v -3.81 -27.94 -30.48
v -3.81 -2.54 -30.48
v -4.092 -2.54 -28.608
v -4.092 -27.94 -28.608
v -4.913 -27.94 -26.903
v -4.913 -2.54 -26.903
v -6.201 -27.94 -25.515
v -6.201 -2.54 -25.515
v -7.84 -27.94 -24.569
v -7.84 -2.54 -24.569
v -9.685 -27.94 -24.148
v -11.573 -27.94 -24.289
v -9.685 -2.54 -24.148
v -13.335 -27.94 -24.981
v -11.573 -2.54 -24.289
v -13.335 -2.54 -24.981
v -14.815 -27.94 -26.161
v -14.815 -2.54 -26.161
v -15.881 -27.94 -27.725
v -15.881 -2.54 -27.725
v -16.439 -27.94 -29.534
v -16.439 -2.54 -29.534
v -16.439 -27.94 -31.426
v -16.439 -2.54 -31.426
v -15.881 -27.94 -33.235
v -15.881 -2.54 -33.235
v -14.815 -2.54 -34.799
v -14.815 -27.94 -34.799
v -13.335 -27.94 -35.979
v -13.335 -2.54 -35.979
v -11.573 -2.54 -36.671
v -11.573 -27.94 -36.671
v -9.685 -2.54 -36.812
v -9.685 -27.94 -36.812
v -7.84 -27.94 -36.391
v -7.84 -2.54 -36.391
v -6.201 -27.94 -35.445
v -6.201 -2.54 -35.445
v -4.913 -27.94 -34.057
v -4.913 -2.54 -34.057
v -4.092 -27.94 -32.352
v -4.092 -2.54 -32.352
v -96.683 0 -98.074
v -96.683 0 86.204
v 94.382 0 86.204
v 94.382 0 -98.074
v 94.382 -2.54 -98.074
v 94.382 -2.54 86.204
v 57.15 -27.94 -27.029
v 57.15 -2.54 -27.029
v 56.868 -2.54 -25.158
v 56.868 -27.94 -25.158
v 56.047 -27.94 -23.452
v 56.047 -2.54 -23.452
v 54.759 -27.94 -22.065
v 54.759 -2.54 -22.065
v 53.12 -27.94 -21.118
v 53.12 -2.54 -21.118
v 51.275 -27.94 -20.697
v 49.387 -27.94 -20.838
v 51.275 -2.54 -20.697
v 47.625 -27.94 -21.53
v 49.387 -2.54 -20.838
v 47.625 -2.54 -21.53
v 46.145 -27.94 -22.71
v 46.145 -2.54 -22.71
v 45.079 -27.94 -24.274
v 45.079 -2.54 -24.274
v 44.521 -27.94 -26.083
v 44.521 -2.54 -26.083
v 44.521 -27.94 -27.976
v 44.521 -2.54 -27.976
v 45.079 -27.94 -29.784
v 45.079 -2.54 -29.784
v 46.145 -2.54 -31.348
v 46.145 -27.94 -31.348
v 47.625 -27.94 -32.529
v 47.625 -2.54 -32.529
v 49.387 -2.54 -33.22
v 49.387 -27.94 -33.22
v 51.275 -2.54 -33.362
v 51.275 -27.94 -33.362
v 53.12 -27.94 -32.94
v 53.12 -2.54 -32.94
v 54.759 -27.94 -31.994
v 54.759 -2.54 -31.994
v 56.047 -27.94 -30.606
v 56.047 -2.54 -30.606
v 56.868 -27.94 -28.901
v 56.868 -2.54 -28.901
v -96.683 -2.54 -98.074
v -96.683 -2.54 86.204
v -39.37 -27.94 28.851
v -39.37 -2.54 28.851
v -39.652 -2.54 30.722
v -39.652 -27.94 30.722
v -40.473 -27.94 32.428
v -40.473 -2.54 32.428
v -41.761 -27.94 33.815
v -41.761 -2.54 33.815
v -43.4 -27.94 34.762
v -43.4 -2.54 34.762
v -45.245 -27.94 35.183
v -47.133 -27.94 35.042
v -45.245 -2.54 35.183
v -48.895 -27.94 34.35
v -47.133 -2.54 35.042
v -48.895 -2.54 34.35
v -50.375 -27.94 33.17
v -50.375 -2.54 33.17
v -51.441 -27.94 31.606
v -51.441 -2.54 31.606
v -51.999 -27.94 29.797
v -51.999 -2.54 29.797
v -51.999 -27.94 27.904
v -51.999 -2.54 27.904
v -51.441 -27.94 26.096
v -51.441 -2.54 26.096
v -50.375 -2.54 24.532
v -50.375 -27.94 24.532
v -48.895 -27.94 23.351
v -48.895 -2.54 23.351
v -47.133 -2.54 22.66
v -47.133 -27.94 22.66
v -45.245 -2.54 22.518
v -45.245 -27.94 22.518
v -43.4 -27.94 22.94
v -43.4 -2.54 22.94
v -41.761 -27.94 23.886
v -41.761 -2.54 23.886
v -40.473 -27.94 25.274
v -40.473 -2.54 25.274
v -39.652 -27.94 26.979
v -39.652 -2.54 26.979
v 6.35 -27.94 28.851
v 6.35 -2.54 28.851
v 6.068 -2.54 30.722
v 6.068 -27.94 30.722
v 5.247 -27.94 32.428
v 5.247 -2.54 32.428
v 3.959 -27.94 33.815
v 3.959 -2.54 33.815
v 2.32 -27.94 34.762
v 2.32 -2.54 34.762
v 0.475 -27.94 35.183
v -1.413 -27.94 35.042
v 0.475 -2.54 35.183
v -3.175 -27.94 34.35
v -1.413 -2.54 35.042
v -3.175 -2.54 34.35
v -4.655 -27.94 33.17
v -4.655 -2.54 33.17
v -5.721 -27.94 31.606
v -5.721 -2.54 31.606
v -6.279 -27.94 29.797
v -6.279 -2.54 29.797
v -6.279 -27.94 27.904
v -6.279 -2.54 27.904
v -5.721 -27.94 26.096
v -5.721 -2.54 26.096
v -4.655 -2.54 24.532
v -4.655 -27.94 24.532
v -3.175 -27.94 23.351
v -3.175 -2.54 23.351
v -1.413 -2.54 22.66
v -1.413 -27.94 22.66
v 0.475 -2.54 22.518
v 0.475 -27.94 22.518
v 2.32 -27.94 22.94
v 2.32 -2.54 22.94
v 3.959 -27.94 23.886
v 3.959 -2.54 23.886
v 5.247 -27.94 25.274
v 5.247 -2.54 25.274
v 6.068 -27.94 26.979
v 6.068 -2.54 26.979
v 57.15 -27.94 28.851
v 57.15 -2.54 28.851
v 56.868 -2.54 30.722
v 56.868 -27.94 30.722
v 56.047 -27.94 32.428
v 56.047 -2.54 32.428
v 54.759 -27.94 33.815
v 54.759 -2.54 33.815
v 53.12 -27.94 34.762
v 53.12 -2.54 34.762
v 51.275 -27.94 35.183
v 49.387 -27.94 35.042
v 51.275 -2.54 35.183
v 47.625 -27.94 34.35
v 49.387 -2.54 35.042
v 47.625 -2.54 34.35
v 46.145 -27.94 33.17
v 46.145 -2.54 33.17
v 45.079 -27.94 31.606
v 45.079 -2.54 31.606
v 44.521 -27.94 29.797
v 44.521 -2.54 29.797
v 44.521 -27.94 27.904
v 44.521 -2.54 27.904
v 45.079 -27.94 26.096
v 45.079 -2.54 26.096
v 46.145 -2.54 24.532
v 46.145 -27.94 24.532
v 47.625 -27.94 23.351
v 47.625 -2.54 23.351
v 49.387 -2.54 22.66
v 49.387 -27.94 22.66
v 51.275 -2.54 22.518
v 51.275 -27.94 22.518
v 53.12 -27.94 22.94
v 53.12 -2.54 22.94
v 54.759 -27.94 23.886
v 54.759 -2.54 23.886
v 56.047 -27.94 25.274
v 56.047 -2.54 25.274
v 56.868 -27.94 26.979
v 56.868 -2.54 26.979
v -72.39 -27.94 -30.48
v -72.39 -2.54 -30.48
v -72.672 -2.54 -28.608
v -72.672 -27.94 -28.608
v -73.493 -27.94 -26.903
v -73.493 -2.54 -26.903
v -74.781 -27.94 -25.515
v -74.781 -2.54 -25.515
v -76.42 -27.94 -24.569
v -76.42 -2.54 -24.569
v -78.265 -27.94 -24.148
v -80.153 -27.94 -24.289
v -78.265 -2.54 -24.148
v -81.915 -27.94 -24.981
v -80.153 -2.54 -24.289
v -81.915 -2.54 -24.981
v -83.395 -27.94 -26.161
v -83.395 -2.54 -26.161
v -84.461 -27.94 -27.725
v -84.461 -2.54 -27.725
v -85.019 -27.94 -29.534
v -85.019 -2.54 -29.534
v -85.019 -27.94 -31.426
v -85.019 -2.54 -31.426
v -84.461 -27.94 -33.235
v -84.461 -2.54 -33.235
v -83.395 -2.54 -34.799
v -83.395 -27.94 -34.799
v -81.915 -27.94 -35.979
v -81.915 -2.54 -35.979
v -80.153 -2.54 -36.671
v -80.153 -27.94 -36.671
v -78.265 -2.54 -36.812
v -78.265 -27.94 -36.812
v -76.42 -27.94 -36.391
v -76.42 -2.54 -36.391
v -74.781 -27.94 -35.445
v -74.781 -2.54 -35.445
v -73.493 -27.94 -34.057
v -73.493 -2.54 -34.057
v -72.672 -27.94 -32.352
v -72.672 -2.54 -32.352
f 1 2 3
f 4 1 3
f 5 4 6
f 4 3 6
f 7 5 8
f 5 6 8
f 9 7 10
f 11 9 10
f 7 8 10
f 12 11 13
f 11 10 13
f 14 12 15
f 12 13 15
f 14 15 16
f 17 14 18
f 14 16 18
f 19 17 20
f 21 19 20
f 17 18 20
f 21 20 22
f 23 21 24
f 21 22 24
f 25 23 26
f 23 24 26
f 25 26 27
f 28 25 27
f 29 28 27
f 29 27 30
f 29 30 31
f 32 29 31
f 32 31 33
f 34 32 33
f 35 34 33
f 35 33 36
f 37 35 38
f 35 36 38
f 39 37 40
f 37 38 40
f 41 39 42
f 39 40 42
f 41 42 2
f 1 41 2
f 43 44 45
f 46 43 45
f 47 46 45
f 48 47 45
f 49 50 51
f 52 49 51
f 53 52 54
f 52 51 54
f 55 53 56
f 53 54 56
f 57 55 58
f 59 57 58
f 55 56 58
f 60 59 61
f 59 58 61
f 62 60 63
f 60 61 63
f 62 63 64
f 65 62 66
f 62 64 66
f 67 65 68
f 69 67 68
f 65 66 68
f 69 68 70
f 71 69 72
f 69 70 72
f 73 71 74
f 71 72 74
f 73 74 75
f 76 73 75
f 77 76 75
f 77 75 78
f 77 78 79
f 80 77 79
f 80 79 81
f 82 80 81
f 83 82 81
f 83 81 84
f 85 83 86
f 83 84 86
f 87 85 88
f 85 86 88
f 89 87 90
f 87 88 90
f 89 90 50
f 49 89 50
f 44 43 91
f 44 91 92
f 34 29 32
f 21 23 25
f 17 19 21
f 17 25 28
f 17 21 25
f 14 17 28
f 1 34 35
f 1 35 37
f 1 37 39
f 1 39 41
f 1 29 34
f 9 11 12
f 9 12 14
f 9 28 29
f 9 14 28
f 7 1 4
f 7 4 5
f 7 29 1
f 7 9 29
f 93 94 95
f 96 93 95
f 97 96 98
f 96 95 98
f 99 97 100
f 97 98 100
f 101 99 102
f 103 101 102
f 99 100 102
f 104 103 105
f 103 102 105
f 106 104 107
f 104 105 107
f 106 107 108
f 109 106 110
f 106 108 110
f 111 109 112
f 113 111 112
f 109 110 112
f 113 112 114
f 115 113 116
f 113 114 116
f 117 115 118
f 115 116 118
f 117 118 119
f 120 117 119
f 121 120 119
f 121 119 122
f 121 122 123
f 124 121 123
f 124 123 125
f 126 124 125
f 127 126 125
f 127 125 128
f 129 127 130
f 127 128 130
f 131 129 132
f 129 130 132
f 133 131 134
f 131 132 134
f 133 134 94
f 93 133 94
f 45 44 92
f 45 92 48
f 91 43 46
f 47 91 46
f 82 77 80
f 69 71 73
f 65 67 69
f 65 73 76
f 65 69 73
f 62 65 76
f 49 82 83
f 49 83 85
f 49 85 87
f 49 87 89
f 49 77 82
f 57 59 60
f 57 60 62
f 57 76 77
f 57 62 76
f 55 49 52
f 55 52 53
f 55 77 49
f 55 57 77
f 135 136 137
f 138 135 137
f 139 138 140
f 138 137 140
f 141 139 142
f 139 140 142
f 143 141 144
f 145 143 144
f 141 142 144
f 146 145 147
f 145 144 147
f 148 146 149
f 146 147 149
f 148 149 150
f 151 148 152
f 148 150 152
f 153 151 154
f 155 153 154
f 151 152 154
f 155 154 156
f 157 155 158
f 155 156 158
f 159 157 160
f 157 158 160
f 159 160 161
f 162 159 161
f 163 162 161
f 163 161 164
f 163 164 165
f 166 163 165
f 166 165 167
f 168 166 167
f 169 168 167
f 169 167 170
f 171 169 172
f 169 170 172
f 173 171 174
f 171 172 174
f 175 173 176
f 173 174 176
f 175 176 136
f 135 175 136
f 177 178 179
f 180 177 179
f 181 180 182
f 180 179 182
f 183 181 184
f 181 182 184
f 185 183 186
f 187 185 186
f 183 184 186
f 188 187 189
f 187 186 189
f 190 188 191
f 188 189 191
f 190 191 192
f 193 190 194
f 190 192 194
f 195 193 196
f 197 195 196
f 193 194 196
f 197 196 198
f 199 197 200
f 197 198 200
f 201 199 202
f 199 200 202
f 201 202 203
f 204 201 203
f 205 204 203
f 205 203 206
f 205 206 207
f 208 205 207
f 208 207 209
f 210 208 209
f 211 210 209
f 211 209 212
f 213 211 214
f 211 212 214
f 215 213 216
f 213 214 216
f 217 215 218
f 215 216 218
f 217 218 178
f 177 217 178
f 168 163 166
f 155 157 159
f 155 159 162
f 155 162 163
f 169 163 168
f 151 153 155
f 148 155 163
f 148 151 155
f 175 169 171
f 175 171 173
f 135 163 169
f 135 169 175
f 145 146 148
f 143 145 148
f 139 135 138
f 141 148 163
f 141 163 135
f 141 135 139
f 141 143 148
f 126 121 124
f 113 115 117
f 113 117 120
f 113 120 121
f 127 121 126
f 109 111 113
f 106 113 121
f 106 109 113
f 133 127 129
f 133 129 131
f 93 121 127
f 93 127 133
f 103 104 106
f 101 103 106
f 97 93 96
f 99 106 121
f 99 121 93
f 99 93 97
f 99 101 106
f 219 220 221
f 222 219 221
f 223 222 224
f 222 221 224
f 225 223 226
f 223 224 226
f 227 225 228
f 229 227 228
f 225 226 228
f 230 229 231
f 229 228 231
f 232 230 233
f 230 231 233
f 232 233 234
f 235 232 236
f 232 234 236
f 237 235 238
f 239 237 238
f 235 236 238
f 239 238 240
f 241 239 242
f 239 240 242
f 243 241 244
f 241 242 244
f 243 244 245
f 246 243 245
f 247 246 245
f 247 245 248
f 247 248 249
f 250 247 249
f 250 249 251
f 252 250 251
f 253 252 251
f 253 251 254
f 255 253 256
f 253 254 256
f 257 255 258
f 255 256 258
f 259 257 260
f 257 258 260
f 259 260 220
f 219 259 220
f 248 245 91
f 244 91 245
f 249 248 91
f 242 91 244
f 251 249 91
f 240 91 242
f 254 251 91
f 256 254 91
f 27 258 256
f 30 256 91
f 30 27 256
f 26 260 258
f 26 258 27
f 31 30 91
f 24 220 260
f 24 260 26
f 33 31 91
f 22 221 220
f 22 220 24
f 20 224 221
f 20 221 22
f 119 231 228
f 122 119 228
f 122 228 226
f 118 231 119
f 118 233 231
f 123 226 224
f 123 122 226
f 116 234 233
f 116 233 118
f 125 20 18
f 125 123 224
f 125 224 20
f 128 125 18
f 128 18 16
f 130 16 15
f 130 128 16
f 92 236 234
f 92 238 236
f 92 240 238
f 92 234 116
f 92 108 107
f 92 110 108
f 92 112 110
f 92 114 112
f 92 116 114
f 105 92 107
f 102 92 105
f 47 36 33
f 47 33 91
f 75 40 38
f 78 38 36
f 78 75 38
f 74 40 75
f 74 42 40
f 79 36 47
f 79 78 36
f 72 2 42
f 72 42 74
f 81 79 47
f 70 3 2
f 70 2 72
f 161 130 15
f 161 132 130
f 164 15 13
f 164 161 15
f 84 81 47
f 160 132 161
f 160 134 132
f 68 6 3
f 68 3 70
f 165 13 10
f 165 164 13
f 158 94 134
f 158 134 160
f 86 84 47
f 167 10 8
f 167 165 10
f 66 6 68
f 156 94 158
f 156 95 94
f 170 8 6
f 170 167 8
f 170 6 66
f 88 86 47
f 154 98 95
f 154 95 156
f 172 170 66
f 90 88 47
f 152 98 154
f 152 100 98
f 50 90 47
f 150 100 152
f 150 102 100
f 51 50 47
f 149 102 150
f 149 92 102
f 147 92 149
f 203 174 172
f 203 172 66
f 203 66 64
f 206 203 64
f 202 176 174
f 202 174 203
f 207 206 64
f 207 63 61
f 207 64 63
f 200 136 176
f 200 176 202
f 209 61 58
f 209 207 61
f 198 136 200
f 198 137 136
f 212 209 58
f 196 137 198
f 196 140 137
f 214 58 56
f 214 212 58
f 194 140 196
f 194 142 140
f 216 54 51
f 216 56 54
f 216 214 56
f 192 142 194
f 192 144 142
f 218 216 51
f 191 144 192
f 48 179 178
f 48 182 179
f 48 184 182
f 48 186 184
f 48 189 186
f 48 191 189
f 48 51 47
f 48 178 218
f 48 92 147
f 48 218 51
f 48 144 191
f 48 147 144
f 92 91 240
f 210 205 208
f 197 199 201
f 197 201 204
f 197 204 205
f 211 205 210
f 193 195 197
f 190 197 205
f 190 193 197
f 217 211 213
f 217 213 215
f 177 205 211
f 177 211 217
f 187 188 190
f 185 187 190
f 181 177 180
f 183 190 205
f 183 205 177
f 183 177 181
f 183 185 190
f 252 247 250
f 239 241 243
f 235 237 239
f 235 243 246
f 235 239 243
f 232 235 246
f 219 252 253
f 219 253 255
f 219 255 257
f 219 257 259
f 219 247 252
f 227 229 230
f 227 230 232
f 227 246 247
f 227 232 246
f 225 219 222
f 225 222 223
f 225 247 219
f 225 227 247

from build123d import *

# Parameters (mm, degrees)
F0_W     = 191.065363
F0_H     = 184.277974
F1_DEPTH = 2.54
F2_R     = 6.35
F3_DEPTH = 25.4
F4_DEPTH = 25.4
F5_DEPTH = 25.4
F6_DEPTH = 25.4
F7_DEPTH = 25.4


with BuildPart() as f1:
    # F0 (on Front) → F1 (new body)
    with BuildSketch(Plane.XZ):
        with Locations((-1.150605, -5.934697)):
            Rectangle(F0_W, F0_H)
    extrude(amount=F1_DEPTH)

    # F2 (on face) → F3 (join)
    with BuildSketch(Plane.XZ.offset(2.54)):
        with Locations((-45.72, 28.85074)):
            Circle(F2_R)
    extrude(amount=F3_DEPTH)

    # F2 (on face) → F4 (join)
    with BuildSketch(Plane.XZ.offset(2.54)):
        with Locations((0, 28.85074)):
            Circle(F2_R)
        with Locations((50.8, 28.85074)):
            Circle(F2_R)
    extrude(amount=F4_DEPTH)

    # F2 (on face) → F5 (join)
    with BuildSketch(Plane.XZ.offset(2.54)):
        with Locations((-78.74, -30.48)):
            Circle(F2_R)
    extrude(amount=F5_DEPTH)

    # F2 (on face) → F6 (join)
    with BuildSketch(Plane.XZ.offset(2.54)):
        with Locations((50.8, -27.02926)):
            Circle(F2_R)
    extrude(amount=F6_DEPTH)

    # F2 (on face) → F7 (join)
    with BuildSketch(Plane.XZ.offset(2.54)):
        with Locations((-10.16, -30.48)):
            Circle(F2_R)
    extrude(amount=F7_DEPTH)


solid = f1.part
